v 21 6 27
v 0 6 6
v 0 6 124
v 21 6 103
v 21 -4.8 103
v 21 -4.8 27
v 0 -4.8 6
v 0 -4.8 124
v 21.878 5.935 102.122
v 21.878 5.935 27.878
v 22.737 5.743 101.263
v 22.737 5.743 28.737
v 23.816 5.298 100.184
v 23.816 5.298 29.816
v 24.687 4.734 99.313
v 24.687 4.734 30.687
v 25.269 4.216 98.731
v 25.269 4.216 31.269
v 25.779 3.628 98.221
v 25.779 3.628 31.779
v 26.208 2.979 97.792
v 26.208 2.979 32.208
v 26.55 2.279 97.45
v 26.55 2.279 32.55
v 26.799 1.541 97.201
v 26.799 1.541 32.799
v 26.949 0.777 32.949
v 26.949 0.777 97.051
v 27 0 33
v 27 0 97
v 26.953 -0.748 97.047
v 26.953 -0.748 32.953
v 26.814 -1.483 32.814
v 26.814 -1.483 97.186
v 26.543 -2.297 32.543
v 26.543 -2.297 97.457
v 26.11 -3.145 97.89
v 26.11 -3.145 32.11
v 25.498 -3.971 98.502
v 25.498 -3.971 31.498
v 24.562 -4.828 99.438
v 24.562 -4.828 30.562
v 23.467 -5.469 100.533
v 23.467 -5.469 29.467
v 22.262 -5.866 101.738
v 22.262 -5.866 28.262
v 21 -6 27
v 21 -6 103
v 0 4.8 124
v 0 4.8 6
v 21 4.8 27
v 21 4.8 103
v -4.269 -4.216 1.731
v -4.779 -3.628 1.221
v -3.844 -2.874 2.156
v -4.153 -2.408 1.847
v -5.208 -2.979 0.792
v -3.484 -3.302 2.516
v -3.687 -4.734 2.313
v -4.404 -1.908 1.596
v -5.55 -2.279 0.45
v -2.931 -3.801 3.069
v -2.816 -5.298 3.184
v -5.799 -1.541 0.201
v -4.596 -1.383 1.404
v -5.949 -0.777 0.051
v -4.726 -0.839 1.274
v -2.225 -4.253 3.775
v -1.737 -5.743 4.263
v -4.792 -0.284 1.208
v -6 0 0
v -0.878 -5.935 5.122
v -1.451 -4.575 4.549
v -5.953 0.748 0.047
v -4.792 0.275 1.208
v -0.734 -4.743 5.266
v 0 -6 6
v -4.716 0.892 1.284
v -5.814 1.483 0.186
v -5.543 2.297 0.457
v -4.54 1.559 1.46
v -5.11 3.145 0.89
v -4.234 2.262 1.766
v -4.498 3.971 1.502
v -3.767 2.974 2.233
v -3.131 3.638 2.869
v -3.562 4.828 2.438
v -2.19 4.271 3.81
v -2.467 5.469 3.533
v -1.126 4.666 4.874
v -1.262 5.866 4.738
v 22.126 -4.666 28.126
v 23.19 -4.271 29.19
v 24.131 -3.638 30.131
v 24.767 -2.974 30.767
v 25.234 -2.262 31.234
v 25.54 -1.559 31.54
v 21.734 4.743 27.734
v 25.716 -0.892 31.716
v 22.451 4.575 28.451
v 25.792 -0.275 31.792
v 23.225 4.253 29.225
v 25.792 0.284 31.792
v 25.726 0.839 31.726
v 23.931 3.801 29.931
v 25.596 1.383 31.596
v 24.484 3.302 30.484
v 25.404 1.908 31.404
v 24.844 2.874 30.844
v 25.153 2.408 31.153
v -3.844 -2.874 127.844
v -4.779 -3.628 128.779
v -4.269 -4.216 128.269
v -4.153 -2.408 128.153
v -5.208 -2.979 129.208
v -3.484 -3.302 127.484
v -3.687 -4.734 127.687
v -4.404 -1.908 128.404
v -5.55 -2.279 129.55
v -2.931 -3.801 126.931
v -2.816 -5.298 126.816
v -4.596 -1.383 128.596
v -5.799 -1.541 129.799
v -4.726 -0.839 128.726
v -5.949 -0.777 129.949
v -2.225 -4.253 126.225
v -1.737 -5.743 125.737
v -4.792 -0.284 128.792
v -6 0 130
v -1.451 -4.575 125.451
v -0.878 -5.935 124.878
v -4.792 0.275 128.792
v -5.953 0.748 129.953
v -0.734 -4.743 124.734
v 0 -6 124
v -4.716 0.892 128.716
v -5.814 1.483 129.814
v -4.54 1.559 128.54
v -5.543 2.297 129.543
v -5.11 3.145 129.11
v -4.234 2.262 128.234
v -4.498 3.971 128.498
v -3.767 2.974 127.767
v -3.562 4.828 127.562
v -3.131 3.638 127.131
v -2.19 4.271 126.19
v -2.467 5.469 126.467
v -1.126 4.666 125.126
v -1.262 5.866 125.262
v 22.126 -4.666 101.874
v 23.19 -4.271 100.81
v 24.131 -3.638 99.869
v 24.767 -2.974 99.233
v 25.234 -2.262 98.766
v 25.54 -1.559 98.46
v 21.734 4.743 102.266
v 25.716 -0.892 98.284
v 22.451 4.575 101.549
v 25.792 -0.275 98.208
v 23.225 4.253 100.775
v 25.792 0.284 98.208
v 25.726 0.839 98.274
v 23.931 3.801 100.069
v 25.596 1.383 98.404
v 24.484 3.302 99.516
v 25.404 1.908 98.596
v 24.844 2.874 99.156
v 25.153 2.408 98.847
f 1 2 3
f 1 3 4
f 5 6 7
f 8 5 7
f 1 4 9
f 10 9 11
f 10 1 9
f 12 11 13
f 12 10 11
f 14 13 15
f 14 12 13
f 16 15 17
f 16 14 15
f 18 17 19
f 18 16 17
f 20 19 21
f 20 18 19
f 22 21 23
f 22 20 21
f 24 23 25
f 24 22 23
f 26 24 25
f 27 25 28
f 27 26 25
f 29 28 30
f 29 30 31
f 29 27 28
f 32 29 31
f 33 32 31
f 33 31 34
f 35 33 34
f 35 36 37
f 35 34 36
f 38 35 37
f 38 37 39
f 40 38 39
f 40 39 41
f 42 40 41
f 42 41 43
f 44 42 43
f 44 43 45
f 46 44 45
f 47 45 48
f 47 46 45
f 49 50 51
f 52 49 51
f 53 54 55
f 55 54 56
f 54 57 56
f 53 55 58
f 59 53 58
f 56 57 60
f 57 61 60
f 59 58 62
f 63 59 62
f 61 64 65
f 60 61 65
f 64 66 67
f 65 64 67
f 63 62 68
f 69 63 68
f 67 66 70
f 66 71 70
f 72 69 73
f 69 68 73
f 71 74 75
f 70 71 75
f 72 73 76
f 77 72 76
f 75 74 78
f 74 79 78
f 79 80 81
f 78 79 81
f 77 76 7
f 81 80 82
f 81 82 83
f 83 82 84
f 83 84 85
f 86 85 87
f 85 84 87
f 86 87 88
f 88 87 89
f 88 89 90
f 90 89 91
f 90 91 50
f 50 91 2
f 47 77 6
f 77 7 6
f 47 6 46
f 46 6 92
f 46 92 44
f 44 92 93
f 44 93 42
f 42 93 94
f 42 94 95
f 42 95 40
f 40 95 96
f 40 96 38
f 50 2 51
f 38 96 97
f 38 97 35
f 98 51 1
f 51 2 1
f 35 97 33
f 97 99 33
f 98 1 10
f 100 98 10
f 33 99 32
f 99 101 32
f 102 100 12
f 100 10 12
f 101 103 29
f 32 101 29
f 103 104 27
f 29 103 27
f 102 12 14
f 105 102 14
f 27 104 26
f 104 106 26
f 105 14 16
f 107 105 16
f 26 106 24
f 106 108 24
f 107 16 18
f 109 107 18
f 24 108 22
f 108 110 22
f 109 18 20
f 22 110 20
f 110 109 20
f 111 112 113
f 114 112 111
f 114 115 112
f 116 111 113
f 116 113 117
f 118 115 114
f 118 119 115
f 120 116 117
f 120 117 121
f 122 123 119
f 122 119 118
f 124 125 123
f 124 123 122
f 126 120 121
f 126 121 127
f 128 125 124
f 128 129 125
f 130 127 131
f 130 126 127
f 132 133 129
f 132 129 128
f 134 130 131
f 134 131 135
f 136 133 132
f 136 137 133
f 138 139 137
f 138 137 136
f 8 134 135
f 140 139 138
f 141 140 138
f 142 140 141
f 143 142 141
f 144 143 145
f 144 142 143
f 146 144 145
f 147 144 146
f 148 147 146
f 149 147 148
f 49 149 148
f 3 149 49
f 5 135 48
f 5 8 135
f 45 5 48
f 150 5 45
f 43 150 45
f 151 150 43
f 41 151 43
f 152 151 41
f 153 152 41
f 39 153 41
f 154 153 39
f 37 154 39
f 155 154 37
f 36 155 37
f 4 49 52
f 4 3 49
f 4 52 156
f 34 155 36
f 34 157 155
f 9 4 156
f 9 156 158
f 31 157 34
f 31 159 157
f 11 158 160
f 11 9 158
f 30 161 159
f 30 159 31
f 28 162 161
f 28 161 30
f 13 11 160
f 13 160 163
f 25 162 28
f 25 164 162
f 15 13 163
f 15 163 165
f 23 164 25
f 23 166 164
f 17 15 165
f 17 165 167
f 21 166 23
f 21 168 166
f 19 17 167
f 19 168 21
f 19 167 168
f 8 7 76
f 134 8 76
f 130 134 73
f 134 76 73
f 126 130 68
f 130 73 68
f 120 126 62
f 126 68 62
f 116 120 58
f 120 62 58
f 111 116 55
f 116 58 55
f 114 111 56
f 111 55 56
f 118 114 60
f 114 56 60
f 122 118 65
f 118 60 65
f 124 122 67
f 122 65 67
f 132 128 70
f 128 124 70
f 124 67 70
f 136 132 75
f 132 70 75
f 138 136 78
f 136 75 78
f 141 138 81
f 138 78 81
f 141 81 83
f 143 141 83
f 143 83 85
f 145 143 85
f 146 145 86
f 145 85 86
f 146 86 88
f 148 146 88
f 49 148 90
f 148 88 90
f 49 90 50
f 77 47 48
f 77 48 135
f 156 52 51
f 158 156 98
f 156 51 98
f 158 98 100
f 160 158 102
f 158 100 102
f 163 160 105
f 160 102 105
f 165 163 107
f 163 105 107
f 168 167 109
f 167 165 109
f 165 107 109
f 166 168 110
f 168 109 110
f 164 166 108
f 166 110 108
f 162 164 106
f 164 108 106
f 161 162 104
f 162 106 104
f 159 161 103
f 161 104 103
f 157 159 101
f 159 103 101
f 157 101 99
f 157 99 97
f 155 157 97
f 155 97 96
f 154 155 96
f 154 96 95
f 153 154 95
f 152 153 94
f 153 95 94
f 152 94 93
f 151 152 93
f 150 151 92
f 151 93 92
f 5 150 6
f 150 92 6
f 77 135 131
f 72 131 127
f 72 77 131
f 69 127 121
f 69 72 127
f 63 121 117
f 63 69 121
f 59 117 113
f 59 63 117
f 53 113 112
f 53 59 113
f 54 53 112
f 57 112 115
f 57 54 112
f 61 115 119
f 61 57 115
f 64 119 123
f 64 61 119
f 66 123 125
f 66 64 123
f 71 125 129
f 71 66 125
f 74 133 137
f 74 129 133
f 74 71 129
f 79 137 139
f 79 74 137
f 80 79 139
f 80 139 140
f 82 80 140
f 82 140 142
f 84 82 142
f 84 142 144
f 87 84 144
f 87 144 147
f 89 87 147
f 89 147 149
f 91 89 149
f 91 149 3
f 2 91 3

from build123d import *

# Parameters (mm, degrees)
BOSS_EXTRUDE1_DEPTH = 130
CUT_EXTRUDE1_DEPTH  = 30


with BuildPart() as part:
    # Sketch1 → Boss-Extrude1 (new body)
    with BuildSketch(Plane.XY):
        with BuildLine():
            Line((0, 6), (21, 6))
            ThreePointArc((21, 6), (27, 0), (21, -6))
            Line((21, -6), (0, -6))
            ThreePointArc((0, -6), (-6, 0), (0, 6))
        make_face()
        with BuildLine():
            Line((0, 4.8), (21, 4.8))
            ThreePointArc((21, 4.8), (25.8, 0), (21, -4.8))
            Line((21, -4.8), (0, -4.8))
            ThreePointArc((0, -4.8), (-4.8, 0), (0, 4.8))
        make_face(mode=Mode.SUBTRACT)
    extrude(amount=BOSS_EXTRUDE1_DEPTH)

    # Sketch2 → Cut-Extrude1 (cut)
    with BuildSketch(Plane(origin=(0, 6, 0), x_dir=(1, 0, 0), z_dir=(0, 1, 0))):
        Polygon((-6, 0), (27, -33), (27, 0), align=None)
        Polygon((-6, -130), (27, -97), (27, -130), align=None)
    extrude(amount=-CUT_EXTRUDE1_DEPTH, mode=Mode.SUBTRACT)


solid = part.part
